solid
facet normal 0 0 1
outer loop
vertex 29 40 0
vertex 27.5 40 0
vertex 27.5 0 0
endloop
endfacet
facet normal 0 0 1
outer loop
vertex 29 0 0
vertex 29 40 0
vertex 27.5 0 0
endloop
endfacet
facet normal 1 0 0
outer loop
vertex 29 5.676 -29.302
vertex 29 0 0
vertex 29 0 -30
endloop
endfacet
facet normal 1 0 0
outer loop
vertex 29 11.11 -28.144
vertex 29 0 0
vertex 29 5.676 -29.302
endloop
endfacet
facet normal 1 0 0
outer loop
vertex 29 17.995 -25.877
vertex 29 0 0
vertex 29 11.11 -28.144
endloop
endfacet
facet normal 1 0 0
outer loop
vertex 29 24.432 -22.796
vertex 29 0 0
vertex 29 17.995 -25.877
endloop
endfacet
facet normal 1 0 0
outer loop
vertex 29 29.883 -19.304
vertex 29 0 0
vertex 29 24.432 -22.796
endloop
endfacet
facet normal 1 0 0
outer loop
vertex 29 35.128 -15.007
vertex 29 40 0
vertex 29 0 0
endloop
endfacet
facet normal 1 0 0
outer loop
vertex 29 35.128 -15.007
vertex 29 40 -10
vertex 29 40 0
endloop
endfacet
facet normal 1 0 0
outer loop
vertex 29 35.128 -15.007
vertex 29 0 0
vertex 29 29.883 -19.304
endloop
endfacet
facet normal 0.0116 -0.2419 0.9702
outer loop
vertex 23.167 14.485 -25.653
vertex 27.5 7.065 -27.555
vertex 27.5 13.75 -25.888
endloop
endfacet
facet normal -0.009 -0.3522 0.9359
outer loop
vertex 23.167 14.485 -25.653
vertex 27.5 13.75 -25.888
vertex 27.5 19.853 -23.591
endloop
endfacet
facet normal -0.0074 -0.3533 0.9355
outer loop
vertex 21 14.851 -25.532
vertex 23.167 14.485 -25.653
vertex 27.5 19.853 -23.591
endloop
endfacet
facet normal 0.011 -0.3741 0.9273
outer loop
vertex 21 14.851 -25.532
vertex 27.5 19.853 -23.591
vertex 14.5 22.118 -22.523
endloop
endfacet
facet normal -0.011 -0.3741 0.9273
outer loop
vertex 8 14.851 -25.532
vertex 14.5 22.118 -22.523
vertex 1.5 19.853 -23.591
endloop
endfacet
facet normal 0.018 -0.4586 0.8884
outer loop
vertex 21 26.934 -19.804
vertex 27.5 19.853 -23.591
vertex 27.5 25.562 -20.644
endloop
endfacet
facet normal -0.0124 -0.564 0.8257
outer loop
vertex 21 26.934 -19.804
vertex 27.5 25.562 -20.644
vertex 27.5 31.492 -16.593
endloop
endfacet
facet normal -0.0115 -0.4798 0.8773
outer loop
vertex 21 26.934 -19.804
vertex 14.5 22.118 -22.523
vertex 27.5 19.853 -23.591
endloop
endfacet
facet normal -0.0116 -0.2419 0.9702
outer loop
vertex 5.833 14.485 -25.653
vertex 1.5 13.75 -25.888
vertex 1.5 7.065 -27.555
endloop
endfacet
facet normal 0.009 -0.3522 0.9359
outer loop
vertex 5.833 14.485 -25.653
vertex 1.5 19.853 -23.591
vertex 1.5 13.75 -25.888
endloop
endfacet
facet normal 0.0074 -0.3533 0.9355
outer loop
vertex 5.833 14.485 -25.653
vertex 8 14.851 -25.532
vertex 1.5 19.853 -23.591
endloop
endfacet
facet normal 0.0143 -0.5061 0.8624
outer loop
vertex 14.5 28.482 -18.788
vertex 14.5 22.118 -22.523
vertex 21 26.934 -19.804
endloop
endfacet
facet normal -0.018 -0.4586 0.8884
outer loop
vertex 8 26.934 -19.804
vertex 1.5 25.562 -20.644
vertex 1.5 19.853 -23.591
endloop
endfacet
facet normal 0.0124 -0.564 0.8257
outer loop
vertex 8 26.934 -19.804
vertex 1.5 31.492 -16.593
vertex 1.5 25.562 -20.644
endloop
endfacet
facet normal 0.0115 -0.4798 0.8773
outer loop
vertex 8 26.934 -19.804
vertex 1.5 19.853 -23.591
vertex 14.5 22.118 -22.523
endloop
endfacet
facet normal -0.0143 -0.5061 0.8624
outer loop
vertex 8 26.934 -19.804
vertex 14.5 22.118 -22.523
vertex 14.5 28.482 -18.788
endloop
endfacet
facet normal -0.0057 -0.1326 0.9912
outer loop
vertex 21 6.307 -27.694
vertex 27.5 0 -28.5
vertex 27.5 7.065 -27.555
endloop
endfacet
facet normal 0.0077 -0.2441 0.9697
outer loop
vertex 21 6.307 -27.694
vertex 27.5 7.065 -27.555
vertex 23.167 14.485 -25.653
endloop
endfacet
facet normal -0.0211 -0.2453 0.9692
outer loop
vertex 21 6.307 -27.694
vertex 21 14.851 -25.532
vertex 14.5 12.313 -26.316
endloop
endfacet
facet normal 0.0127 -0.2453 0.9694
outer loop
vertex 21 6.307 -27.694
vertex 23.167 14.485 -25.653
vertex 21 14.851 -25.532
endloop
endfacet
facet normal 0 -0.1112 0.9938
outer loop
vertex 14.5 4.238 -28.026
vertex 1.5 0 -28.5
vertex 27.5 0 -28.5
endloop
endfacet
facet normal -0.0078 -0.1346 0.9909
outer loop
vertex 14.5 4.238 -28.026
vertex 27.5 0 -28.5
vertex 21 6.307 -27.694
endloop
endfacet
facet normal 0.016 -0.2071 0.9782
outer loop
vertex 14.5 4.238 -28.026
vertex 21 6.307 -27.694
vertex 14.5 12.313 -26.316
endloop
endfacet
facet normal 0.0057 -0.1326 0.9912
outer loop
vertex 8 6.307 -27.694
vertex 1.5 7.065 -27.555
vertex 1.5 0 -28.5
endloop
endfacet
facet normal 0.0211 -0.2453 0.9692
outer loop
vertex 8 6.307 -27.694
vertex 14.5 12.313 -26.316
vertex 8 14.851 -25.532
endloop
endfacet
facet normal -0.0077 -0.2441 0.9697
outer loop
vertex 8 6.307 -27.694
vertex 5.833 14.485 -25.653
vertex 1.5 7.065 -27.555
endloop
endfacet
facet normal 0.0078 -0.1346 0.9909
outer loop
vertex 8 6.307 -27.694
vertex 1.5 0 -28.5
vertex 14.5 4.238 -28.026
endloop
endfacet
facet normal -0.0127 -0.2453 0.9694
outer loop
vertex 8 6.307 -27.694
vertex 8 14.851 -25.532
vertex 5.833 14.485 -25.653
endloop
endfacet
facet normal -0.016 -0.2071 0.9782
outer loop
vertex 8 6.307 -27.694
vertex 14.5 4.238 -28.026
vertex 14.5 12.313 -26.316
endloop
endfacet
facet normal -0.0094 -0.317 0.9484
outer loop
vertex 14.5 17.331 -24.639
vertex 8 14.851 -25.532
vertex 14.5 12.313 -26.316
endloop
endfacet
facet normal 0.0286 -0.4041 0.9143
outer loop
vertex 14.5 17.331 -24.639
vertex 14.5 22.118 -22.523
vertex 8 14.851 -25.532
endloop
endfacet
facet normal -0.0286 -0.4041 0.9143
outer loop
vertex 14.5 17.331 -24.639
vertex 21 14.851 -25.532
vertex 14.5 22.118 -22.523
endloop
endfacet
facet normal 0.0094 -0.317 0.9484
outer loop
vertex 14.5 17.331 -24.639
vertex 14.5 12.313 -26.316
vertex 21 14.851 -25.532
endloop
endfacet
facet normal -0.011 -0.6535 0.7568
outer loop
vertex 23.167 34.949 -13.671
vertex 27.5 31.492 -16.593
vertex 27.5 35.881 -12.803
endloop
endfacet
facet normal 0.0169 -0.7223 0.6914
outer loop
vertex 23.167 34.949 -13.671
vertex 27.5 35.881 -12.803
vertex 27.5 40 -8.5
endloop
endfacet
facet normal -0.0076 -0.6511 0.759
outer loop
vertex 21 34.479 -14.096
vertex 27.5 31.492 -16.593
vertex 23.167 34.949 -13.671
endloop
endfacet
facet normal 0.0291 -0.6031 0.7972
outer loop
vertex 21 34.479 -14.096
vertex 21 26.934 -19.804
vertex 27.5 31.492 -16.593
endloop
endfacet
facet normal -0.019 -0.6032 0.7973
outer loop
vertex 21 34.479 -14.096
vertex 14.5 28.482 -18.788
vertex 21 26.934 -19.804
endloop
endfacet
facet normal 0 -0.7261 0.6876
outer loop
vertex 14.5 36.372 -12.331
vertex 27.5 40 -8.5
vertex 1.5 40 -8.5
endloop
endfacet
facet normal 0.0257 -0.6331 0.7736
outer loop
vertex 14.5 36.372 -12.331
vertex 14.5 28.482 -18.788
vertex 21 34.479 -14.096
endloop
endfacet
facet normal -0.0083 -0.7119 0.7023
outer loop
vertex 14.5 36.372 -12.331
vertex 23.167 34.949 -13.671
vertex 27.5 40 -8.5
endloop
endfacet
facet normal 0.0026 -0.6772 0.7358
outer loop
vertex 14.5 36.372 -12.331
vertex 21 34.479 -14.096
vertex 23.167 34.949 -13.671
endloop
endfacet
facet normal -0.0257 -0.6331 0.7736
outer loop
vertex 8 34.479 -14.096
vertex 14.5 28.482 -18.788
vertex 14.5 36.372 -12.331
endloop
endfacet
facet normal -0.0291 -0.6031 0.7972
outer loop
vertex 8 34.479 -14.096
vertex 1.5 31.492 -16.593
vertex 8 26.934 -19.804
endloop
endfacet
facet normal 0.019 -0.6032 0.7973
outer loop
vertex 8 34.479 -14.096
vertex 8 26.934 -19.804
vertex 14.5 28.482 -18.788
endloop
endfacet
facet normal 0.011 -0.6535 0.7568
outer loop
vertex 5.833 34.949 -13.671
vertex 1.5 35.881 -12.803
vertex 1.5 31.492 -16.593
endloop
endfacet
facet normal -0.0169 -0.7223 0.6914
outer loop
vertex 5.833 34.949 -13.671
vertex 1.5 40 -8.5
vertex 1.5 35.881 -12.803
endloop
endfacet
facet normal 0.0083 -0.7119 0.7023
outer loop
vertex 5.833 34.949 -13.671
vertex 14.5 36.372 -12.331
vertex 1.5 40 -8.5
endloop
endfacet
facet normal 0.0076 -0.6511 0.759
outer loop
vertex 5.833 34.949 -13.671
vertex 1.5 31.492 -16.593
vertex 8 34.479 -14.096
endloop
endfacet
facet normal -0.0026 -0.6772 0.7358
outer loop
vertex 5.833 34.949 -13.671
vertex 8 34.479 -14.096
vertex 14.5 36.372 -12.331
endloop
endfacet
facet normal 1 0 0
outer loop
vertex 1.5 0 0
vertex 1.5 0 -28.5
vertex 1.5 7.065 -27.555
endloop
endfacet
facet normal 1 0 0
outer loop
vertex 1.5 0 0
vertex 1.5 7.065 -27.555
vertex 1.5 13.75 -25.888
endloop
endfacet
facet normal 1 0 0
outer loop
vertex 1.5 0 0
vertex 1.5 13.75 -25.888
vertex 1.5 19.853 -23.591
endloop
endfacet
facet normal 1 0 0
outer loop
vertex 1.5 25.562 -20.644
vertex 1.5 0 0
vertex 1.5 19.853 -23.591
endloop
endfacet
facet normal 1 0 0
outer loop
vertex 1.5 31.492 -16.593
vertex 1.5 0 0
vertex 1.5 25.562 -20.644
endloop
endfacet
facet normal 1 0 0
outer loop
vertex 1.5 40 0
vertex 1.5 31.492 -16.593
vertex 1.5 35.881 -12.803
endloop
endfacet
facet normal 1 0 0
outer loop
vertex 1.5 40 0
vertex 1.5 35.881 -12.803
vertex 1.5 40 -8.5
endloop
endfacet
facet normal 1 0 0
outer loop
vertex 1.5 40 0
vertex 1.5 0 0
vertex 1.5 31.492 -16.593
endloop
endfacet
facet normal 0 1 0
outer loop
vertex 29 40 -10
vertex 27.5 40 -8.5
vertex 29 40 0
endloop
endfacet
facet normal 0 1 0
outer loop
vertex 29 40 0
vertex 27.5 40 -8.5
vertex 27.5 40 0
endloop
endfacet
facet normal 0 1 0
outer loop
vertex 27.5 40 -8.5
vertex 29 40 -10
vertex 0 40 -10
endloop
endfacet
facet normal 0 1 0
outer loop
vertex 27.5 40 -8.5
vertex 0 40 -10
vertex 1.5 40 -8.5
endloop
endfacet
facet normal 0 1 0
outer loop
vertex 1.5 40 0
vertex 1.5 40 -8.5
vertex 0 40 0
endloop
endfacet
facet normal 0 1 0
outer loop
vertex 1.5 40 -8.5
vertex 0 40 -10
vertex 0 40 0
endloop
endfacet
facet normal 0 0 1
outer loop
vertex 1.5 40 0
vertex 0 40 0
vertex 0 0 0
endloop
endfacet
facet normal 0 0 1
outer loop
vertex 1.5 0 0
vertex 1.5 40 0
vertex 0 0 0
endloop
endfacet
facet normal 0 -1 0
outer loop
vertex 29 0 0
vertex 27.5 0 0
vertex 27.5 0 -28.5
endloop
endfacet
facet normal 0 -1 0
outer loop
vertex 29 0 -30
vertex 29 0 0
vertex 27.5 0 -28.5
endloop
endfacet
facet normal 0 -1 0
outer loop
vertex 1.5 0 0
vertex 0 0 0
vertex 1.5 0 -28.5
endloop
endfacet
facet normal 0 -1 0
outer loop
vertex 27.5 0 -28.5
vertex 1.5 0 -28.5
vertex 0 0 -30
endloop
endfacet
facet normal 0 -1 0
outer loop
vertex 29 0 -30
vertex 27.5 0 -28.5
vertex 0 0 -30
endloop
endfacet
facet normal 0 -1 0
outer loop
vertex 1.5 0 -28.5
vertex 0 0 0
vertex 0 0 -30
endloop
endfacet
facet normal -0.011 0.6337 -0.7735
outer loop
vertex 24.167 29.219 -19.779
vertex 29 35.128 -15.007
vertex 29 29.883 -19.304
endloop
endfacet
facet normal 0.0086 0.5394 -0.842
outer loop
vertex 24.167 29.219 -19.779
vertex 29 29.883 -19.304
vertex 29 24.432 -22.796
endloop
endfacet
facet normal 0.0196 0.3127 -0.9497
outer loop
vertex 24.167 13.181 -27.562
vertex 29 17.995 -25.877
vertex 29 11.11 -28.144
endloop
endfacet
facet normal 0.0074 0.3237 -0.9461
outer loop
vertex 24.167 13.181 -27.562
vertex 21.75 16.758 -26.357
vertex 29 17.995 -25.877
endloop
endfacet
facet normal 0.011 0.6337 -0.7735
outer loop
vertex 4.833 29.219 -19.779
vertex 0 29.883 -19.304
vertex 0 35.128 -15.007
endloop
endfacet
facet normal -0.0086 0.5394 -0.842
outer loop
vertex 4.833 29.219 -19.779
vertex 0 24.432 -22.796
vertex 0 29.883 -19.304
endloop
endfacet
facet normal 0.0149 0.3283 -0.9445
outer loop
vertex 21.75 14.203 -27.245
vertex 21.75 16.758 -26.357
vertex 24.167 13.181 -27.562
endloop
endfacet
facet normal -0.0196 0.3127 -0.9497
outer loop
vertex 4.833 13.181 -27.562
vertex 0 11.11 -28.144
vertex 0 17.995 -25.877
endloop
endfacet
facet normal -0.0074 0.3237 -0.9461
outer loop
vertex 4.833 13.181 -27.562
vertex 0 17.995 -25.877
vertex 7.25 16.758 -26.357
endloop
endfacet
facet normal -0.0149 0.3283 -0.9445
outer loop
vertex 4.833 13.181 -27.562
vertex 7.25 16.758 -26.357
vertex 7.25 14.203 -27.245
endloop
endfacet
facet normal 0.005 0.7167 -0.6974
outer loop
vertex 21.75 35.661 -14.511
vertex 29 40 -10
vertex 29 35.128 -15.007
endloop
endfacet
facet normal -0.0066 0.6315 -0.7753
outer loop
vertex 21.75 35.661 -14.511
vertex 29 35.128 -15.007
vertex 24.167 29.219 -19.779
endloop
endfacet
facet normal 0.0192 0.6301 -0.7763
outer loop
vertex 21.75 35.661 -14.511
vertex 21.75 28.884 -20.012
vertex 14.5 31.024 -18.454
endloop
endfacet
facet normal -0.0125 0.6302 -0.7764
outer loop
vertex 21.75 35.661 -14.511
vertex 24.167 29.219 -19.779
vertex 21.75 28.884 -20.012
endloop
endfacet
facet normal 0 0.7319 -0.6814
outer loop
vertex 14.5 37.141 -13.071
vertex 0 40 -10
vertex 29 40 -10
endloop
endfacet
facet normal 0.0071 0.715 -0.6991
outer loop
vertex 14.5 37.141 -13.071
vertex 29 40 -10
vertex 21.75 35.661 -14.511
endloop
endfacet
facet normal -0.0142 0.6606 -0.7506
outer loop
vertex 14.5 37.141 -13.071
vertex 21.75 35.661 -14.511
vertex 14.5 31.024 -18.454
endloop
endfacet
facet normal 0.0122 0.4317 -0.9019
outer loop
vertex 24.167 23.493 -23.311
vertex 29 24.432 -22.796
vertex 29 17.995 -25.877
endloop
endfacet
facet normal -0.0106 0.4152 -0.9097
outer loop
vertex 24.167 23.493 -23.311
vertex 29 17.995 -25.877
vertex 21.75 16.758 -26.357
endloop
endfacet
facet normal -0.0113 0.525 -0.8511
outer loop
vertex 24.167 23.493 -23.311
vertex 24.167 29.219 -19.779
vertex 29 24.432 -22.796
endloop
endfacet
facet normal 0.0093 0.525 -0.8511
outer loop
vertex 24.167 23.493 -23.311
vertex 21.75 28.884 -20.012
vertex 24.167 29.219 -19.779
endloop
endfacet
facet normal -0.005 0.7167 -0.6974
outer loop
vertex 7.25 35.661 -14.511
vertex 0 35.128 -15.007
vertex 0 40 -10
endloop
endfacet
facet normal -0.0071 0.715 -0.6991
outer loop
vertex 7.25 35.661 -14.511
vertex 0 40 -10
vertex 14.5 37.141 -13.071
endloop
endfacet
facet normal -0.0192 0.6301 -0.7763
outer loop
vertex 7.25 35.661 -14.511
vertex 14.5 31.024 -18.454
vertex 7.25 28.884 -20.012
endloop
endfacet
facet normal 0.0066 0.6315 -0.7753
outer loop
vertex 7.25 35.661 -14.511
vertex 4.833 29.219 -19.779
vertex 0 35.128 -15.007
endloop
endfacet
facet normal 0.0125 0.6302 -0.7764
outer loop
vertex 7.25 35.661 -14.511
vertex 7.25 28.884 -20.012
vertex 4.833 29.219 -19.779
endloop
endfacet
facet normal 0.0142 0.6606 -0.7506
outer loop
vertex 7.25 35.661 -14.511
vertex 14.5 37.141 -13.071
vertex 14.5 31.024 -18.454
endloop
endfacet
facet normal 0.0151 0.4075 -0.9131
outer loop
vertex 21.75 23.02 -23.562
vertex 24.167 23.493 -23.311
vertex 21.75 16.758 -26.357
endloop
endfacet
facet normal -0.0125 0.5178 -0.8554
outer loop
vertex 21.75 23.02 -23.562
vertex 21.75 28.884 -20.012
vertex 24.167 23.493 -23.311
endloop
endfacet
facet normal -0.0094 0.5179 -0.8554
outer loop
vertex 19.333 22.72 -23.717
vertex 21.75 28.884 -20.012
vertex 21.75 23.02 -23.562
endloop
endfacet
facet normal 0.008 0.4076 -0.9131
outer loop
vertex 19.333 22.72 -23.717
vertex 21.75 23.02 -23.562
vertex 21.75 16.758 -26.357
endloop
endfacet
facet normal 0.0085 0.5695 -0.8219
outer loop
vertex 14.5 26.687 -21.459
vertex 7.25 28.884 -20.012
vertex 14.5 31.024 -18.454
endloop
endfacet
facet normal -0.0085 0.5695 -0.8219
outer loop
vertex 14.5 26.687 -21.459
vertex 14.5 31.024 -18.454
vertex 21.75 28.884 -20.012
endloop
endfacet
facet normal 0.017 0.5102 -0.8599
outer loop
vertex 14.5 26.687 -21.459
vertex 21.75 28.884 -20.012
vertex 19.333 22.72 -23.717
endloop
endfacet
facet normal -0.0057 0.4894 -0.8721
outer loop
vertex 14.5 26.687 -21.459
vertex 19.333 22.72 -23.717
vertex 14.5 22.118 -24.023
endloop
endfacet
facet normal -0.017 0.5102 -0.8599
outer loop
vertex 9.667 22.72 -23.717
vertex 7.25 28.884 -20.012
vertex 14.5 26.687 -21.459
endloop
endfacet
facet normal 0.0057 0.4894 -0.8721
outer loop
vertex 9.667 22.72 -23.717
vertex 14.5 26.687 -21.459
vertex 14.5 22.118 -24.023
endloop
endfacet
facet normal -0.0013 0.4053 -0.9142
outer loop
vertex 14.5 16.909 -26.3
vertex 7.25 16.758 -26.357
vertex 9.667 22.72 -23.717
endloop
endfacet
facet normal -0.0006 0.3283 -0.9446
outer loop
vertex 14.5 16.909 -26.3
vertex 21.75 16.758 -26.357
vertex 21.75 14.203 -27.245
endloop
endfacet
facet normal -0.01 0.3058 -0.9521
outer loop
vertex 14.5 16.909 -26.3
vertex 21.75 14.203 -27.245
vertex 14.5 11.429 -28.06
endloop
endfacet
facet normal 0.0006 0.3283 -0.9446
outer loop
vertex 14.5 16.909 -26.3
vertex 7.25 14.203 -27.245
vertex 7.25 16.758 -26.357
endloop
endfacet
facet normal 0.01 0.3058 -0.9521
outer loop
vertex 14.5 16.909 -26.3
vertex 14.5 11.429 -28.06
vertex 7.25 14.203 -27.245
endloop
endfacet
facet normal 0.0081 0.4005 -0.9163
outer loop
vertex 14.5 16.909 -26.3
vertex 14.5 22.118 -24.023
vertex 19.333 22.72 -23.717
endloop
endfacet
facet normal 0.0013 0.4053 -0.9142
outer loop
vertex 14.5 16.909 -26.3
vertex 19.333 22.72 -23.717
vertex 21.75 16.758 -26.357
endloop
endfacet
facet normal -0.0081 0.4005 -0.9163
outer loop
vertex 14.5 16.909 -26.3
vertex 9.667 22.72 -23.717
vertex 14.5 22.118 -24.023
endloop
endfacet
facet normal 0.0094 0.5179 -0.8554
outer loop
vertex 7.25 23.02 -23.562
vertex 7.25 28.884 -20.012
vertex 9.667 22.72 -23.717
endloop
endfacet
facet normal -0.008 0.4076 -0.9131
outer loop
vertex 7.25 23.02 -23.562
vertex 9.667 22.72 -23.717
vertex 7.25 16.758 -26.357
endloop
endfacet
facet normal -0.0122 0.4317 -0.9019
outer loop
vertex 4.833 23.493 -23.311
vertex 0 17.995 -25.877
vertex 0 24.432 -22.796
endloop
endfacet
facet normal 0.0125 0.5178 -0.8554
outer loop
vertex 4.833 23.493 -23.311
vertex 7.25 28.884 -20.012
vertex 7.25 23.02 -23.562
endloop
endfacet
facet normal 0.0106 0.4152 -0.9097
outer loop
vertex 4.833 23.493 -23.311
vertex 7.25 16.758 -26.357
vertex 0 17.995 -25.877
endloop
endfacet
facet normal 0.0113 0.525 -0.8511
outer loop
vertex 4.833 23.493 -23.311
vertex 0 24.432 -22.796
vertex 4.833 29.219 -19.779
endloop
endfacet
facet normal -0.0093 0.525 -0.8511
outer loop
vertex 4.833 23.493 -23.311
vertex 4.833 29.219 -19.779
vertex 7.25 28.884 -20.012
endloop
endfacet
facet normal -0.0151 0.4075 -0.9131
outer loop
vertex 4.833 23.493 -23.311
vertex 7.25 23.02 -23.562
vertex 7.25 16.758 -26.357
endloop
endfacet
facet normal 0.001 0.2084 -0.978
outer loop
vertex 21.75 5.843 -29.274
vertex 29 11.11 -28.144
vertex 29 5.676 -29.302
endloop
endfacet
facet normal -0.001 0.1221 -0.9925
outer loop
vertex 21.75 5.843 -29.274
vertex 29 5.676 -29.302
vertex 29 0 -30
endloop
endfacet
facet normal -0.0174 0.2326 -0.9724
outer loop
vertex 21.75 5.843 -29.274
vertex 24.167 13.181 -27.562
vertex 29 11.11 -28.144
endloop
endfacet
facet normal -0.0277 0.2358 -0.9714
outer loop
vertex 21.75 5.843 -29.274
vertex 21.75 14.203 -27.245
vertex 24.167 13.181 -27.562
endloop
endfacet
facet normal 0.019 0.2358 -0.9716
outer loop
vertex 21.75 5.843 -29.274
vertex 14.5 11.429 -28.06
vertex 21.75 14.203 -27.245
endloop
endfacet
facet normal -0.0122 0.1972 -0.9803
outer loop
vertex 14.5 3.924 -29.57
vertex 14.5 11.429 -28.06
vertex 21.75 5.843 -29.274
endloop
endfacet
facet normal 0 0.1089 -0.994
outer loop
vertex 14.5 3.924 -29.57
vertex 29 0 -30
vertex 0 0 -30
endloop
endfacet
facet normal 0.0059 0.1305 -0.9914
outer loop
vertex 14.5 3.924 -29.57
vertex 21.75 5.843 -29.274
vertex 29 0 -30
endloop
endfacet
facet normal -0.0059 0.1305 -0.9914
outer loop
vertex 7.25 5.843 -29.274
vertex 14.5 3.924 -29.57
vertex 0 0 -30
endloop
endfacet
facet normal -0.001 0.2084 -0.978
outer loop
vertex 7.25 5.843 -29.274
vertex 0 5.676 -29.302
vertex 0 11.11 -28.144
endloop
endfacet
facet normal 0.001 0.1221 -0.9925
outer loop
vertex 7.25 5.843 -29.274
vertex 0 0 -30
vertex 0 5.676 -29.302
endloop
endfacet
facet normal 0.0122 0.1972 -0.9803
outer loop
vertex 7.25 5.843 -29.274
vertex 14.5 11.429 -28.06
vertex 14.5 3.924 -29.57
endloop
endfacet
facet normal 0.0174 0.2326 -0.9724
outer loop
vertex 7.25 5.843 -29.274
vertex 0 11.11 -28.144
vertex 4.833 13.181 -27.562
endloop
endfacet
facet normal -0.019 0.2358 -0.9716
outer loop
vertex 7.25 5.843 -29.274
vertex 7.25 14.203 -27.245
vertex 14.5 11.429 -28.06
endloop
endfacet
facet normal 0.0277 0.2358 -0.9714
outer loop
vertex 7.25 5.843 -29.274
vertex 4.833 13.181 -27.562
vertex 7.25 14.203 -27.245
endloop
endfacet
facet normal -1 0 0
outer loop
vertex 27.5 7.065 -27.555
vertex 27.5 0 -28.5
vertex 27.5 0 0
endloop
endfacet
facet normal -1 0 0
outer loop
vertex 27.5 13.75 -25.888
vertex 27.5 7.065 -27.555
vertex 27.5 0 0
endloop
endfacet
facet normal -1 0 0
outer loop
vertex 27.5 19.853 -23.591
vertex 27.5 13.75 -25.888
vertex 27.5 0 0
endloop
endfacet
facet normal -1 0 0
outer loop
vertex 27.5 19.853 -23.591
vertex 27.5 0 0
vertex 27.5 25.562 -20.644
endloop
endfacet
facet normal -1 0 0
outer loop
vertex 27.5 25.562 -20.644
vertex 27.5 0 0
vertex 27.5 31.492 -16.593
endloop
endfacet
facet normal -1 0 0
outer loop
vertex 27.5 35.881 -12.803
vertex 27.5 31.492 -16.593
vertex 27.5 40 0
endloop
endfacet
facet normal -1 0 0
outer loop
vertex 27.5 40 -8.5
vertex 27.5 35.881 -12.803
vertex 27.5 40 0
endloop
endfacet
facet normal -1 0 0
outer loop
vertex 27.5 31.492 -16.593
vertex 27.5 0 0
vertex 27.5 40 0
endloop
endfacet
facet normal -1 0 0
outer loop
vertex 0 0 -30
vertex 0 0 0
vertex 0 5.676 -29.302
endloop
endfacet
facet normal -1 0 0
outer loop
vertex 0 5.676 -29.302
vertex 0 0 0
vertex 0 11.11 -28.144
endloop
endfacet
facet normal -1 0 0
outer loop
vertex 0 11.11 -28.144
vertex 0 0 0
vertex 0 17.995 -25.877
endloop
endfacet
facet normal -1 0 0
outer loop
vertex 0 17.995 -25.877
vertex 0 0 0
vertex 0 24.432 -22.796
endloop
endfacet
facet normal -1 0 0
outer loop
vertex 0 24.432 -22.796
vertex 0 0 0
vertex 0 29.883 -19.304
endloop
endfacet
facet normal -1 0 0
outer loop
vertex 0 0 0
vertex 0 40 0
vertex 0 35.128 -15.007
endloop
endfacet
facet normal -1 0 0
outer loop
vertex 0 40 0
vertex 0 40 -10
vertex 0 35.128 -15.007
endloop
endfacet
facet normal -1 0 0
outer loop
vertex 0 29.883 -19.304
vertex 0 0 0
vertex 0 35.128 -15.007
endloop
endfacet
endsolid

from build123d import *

# Parameters (mm, degrees)
BOSS_EXTRUDE1_DEPTH = 29
CUT_EXTRUDE1_START  = 1.5
CUT_EXTRUDE1_DEPTH  = 26


# Read off the part's stored shape, not the designer's step: Cut-Extrude1
with BuildPart() as part:
    # Sketch1 → Boss-Extrude1 (new body)
    with BuildSketch(Plane(origin=(0, 0, 0), x_dir=(0, 0, -1), z_dir=(1, 0, 0))):
        with BuildLine():
            Line((0, 40), (0, 0))
            Line((0, 0), (30, 0))
            add(Edge.make_bspline(
                [(10, 40), (28.045726498, 24.235315383), (30, 0)],
                knots=[0, 0, 0, 1, 1, 1], degree=2))
            Line((10, 40), (0, 40))
        make_face()
    extrude(amount=BOSS_EXTRUDE1_DEPTH)

    # Cut-Extrude1 outline → Cut-Extrude1 (cut)
    with BuildSketch(Plane.YZ.offset(CUT_EXTRUDE1_START)):
        with BuildLine():
            Line((0, 0), (0, -28.5))
            add(Edge.make_bspline(
                [(0, -28.5), (24.235315383, -26.545726498), (40, -8.5)],
                knots=[0, 0, 0, 1, 1, 1], degree=2))
            Line((40, -8.5), (40, 0))
            Line((40, 0), (0, 0))
        make_face()
    extrude(amount=CUT_EXTRUDE1_DEPTH, mode=Mode.SUBTRACT)


solid = part.part
